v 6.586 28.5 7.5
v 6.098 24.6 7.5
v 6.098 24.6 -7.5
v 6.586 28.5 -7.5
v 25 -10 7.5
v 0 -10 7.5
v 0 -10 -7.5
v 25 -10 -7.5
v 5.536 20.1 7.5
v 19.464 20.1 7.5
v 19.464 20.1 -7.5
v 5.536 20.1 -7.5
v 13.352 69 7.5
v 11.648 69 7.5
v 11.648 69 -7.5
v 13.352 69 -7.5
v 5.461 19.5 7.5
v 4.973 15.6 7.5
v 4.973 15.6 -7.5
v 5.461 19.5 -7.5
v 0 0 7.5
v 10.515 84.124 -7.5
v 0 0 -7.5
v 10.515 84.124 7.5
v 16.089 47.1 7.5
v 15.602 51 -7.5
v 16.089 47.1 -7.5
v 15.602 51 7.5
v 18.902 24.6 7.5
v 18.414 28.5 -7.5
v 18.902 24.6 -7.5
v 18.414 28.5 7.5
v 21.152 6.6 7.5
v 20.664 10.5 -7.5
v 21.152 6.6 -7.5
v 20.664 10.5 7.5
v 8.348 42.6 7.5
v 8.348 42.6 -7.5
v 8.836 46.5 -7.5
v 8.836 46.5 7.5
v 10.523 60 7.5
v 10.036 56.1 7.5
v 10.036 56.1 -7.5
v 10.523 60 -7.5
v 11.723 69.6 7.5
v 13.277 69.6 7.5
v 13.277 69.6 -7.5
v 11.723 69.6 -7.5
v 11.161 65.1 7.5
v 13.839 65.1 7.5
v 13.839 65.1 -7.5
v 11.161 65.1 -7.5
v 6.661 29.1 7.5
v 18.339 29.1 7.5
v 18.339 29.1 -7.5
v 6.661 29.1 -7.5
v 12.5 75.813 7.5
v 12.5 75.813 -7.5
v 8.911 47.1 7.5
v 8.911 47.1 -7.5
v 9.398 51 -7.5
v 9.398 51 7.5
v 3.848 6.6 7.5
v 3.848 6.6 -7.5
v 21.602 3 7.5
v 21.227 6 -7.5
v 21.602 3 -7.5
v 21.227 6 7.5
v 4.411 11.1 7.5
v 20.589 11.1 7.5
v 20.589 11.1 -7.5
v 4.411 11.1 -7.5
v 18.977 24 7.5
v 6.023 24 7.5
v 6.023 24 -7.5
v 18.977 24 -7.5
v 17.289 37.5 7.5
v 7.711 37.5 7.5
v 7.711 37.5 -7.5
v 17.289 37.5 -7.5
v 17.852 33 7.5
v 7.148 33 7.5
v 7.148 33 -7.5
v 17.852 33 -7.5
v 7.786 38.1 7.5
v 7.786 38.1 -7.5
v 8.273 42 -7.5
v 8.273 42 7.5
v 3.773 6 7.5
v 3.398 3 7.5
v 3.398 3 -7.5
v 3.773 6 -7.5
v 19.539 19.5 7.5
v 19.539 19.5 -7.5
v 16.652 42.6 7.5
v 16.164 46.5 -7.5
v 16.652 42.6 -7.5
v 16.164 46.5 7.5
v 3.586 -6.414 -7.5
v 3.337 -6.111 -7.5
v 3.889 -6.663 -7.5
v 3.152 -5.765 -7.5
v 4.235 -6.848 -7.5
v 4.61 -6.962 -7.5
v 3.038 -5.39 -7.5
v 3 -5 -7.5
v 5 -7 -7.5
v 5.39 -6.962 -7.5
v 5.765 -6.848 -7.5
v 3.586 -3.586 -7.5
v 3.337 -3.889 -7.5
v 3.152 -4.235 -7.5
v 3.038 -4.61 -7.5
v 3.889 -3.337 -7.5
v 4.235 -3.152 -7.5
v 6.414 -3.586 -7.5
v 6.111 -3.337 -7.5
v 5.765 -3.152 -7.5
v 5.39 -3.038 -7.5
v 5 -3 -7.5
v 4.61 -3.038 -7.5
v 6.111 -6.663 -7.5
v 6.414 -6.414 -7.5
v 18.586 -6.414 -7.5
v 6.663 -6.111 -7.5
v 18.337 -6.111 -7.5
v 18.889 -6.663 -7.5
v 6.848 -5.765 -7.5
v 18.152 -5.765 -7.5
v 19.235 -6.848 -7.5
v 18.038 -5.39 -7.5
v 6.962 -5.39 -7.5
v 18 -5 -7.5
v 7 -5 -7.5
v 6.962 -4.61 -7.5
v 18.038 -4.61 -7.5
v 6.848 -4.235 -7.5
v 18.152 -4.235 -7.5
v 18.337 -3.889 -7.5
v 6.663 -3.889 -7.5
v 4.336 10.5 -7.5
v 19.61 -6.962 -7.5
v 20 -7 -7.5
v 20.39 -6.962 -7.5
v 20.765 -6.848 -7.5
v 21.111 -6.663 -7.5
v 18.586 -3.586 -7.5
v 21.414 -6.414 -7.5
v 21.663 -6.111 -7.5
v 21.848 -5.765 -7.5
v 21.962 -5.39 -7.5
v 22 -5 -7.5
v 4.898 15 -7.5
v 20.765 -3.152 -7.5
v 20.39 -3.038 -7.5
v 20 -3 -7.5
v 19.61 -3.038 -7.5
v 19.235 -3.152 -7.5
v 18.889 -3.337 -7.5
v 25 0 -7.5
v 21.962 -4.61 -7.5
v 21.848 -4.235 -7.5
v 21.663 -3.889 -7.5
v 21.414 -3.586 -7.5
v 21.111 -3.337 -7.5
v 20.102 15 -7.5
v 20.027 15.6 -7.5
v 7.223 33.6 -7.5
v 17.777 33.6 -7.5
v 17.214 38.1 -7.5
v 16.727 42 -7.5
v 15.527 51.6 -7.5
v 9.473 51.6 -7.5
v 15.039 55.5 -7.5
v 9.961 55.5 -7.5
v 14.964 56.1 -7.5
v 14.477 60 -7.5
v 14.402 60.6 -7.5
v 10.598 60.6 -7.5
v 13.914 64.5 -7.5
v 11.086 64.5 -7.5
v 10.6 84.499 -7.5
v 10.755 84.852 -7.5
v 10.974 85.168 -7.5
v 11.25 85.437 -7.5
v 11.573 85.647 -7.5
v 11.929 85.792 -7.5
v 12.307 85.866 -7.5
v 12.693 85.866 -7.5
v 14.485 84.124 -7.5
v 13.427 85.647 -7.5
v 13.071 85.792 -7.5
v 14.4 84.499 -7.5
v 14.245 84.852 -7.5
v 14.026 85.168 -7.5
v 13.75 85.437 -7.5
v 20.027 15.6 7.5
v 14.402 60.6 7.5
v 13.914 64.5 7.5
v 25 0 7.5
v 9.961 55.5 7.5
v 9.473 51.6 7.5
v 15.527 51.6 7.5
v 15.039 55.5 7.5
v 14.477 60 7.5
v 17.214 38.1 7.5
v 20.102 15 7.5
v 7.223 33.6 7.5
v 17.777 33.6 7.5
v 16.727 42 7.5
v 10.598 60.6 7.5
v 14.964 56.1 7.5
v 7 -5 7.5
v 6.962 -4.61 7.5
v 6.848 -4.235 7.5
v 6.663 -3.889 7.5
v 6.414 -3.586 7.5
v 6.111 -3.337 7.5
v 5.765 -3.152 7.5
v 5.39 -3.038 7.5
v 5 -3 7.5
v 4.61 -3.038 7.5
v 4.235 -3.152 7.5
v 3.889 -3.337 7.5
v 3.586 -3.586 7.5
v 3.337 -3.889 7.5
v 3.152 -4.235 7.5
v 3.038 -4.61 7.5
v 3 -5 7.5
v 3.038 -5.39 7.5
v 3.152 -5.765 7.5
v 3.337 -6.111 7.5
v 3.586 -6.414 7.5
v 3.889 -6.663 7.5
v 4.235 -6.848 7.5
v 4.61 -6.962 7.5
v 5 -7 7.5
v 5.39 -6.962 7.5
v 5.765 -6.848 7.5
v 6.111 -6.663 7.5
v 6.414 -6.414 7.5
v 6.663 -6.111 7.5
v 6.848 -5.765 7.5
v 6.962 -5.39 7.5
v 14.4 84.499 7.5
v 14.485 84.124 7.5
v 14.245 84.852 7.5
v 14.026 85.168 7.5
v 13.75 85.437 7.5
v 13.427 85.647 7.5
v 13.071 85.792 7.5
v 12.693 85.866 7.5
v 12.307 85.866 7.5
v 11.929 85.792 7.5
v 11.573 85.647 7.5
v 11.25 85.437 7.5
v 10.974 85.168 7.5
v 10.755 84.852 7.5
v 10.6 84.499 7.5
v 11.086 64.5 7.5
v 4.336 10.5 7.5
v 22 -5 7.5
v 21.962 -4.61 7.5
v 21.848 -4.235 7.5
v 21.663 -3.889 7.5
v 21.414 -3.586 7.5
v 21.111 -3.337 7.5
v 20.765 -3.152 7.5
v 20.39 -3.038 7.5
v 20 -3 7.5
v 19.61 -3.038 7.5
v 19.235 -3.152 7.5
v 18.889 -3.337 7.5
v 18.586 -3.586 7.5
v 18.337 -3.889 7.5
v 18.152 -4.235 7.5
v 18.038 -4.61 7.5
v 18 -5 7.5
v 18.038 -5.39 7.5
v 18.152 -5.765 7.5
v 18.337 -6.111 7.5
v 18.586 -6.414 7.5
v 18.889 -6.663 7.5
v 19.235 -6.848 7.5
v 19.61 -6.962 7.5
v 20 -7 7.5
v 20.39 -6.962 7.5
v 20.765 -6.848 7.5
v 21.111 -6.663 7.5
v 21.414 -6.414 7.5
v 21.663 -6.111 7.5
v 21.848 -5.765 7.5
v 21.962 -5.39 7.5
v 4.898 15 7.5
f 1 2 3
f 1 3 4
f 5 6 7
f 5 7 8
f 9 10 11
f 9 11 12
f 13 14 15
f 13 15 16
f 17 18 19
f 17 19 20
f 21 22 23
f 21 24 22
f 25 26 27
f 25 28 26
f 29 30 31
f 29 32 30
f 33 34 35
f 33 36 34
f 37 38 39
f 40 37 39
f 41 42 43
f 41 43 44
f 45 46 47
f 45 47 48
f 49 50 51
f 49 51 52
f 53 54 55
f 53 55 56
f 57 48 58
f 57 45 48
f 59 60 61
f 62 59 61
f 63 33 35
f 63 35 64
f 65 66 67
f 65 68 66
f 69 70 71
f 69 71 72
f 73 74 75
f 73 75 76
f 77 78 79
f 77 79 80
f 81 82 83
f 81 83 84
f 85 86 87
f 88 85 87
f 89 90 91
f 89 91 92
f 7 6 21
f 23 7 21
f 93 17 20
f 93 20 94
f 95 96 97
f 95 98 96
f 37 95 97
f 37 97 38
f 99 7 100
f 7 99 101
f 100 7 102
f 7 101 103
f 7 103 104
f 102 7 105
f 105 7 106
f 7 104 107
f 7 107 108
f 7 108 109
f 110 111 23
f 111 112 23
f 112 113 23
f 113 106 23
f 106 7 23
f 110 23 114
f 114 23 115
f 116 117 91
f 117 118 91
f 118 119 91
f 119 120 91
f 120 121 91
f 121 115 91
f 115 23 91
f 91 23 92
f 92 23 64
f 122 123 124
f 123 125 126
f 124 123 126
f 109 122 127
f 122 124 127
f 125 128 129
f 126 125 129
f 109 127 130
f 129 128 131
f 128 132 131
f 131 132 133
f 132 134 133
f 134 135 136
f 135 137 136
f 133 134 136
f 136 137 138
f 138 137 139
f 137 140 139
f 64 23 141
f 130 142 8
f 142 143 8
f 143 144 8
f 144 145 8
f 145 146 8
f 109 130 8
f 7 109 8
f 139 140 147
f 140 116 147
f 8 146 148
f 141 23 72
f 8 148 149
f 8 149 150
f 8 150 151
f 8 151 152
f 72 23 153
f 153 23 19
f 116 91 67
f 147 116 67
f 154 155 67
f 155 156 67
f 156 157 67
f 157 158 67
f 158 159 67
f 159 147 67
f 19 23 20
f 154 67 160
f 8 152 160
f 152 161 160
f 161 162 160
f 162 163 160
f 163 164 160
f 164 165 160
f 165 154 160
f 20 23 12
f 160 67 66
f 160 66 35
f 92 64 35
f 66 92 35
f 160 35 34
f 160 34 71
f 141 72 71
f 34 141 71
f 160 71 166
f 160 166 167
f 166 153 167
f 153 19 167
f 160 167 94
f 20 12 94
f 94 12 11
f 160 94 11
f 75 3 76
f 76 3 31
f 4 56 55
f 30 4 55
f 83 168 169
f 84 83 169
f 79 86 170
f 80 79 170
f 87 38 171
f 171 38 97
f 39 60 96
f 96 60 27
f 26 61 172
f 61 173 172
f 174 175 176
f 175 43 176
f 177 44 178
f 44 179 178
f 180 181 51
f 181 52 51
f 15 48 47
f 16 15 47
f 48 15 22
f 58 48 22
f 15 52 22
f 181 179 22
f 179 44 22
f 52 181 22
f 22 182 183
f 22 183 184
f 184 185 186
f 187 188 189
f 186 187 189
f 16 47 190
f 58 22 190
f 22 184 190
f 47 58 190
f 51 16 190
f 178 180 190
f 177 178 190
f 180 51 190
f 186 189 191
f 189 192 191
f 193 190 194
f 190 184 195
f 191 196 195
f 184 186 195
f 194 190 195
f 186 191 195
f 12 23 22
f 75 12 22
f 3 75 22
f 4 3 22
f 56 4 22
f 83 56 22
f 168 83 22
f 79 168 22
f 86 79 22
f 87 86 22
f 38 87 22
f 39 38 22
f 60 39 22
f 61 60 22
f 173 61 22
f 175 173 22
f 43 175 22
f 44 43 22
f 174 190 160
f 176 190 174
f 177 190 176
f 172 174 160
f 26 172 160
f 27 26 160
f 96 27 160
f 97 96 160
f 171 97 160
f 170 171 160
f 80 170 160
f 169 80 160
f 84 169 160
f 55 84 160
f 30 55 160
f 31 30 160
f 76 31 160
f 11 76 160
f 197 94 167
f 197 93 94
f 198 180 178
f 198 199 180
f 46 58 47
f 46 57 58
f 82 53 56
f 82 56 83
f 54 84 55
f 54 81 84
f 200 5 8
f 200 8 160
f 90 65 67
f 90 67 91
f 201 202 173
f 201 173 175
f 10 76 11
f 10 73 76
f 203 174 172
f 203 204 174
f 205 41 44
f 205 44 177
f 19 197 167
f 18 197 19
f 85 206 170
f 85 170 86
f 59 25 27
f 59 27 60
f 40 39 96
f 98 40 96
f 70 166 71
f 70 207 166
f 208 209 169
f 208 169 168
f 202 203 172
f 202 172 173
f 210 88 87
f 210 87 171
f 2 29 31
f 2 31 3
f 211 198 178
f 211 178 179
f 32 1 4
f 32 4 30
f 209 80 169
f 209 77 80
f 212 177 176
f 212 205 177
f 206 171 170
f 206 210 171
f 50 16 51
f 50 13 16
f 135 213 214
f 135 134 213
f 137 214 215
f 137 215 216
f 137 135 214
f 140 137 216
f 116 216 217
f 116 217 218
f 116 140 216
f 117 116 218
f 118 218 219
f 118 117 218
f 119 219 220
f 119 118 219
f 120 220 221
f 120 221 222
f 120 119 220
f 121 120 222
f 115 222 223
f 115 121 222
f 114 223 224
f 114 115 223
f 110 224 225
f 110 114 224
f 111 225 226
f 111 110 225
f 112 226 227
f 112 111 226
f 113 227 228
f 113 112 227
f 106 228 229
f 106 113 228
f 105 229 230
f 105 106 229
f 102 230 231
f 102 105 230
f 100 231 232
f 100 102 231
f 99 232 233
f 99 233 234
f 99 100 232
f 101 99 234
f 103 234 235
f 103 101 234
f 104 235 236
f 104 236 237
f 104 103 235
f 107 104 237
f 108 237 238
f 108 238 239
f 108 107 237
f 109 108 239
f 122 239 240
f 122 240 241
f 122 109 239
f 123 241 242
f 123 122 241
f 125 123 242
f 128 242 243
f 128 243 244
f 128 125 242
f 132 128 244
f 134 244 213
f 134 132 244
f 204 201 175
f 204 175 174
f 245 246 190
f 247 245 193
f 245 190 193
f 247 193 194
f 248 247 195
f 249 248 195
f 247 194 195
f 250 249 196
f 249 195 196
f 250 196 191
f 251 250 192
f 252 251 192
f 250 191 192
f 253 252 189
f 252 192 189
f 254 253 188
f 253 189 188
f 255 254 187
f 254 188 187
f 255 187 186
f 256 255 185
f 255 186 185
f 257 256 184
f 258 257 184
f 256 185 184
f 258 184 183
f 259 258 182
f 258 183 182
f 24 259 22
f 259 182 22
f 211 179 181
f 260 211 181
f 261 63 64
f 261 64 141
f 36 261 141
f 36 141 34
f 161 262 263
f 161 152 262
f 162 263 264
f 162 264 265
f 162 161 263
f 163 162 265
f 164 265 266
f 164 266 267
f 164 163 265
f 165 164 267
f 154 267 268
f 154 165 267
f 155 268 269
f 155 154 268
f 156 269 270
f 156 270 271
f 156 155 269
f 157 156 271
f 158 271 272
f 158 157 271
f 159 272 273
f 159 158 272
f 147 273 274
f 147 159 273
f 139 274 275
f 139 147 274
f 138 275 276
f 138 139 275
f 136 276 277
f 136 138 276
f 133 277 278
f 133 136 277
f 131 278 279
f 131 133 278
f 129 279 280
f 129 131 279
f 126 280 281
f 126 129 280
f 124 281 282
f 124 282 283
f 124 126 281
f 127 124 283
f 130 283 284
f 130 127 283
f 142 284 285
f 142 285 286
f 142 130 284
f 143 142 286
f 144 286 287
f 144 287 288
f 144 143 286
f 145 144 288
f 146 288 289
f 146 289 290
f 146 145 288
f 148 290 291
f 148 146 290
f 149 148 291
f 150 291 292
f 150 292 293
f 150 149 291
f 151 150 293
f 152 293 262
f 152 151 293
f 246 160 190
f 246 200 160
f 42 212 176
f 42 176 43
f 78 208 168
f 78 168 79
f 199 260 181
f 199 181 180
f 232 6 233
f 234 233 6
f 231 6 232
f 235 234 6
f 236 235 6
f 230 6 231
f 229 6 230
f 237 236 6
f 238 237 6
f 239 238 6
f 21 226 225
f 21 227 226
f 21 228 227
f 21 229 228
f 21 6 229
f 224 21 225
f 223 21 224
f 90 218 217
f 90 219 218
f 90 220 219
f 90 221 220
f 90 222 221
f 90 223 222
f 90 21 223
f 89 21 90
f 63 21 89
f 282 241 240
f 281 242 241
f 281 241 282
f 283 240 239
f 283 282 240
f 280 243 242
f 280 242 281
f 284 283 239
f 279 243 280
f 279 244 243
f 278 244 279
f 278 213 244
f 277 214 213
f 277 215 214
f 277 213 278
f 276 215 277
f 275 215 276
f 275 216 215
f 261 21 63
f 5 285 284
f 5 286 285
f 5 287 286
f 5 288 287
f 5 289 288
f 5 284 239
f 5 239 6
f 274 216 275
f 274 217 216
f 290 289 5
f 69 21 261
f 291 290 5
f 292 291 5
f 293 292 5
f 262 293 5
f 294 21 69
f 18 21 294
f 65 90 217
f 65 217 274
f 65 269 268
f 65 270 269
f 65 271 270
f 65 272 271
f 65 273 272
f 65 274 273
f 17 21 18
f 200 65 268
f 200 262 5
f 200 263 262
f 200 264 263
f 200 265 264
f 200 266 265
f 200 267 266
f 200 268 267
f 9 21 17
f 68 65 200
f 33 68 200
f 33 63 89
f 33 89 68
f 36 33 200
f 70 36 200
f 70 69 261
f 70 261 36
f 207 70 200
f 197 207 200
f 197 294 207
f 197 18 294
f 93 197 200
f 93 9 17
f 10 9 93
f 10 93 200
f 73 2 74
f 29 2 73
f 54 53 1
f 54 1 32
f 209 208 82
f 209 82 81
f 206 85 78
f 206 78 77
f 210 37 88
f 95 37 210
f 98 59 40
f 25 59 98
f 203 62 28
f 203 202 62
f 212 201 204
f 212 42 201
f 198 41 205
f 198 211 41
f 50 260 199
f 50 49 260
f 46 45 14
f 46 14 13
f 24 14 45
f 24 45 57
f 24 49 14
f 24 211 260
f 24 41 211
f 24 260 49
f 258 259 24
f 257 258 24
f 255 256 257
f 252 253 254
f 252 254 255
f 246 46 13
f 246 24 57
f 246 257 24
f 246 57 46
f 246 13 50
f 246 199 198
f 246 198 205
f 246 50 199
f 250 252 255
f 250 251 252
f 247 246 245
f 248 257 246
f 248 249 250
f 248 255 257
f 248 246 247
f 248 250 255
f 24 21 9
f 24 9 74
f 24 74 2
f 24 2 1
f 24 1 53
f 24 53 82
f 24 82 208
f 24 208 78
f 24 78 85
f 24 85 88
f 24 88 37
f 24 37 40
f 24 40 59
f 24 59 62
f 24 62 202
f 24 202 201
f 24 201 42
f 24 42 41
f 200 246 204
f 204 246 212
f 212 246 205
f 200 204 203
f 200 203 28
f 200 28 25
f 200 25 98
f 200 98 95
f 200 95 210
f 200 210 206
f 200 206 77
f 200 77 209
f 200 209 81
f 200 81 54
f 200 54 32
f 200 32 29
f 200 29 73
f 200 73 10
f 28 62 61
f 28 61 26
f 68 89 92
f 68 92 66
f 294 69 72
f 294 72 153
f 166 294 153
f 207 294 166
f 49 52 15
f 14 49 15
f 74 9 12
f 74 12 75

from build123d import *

# Parameters (mm, degrees)
F0_W     = 25
F0_H     = 10
F0_R     = 2
F1_DEPTH = 7.5
F2_R     = 2


# Not quite as in the source:
# - a feature names something its author has since deleted; it is built from what else it names


with BuildPart() as f1:
    # F0 (on Top) → F1 (new body, symmetric)
    with BuildSketch(Plane.XY):
        Polygon((17.8516533444, 33), (20.875, 33), (20.8, 33.6), (17.7766533444, 33.6), align=None)
        Polygon((17.7766533444, 33.6), (20.8, 33.6), (20.3125, 37.5), (17.2891533444, 37.5), align=None)
        Polygon((17.2891533444, 37.5), (20.3125, 37.5), (20.2375, 38.1), (17.2141533444, 38.1), align=None)
        Polygon((17.2141533444, 38.1), (20.2375, 38.1), (19.75, 42), (16.7266533444, 42), align=None)
        Polygon((16.7266533444, 42), (19.75, 42), (19.675, 42.6), (16.6516533444, 42.6), align=None)
        Polygon((16.6516533444, 42.6), (19.675, 42.6), (19.1875, 46.5), (16.1641533444, 46.5), align=None)
        Polygon((16.1641533444, 46.5), (19.1875, 46.5), (19.1125, 47.1), (16.0891533444, 47.1), align=None)
        Polygon((16.0891533444, 47.1), (19.1125, 47.1), (18.625, 51), (15.6016533444, 51), align=None)
        Polygon((15.6016533444, 51), (18.625, 51), (18.55, 51.6), (15.5266533444, 51.6), align=None)
        Polygon((15.5266533444, 51.6), (18.55, 51.6), (18.0625, 55.5), (15.0391533444, 55.5), align=None)
        Polygon((15.0391533444, 55.5), (18.0625, 55.5), (17.9875, 56.1), (14.9641533444, 56.1), align=None)
        Polygon((14.9641533444, 56.1), (17.9875, 56.1), (17.5, 60), (14.4766533444, 60), align=None)
        Polygon((14.4766533444, 60), (17.5, 60), (17.425, 60.6), (14.4016533444, 60.6), align=None)
        Polygon((14.4016533444, 60.6), (17.425, 60.6), (16.9375, 64.5), (13.9141533444, 64.5), align=None)
        Polygon((13.9141533444, 64.5), (16.9375, 64.5), (16.8625, 65.1), (13.8391533444, 65.1), align=None)
        Polygon((13.8391533444, 65.1), (16.8625, 65.1), (16.375, 69), (13.3516533444, 69), align=None)
        Polygon((13.3516533444, 69), (16.375, 69), (16.3, 69.6), (13.2766533444, 69.6), align=None)
        Polygon((12.5, 100), (8.7, 69.6), (11.7233466556, 69.6), (12.5, 75.8132267551), (13.2766533444, 69.6), (16.3, 69.6), align=None)
        with Locations((12.5, -5)):
            Rectangle(F0_W, F0_H)
        with Locations((5, -5)):
            Circle(F0_R, mode=Mode.SUBTRACT)
        with Locations((20, -5)):
            Circle(F0_R, mode=Mode.SUBTRACT)
        Polygon((8.0625, 64.5), (7.575, 60.6), (10.5983466556, 60.6), (11.0858466556, 64.5), align=None)
        Polygon((8.7, 69.6), (8.625, 69), (11.6483466556, 69), (11.7233466556, 69.6), align=None)
        Polygon((8.1375, 65.1), (8.0625, 64.5), (11.0858466556, 64.5), (11.1608466556, 65.1), align=None)
        Polygon((8.625, 69), (8.1375, 65.1), (11.1608466556, 65.1), (11.6483466556, 69), align=None)
        Polygon((6.375, 51), (5.8875, 47.1), (8.9108466556, 47.1), (9.3983466556, 51), align=None)
        Polygon((7.5, 60), (7.0125, 56.1), (10.0358466556, 56.1), (10.5233466556, 60), align=None)
        Polygon((7.0125, 56.1), (6.9375, 55.5), (9.9608466556, 55.5), (10.0358466556, 56.1), align=None)
        Polygon((7.575, 60.6), (7.5, 60), (10.5233466556, 60), (10.5983466556, 60.6), align=None)
        Polygon((6.45, 51.6), (6.375, 51), (9.3983466556, 51), (9.4733466556, 51.6), align=None)
        Polygon((6.9375, 55.5), (6.45, 51.6), (9.4733466556, 51.6), (9.9608466556, 55.5), align=None)
        Polygon((5.25, 42), (4.7625, 38.1), (7.7858466556, 38.1), (8.2733466556, 42), align=None)
        Polygon((4.2, 33.6), (4.125, 33), (7.1483466556, 33), (7.2233466556, 33.6), align=None)
        Polygon((5.325, 42.6), (5.25, 42), (8.2733466556, 42), (8.3483466556, 42.6), align=None)
        Polygon((5.8125, 46.5), (5.325, 42.6), (8.3483466556, 42.6), (8.8358466556, 46.5), align=None)
        Polygon((4.6875, 37.5), (4.2, 33.6), (7.2233466556, 33.6), (7.7108466556, 37.5), align=None)
        Polygon((4.125, 33), (0, 0), (25, 0), (20.875, 33), (17.8516533444, 33), (18.3391533444, 29.1), (18.4141533444, 28.5), (18.9016533444, 24.6), (18.9766533444, 24), (19.4641533444, 20.1), (19.5391533444, 19.5), (20.0266533444, 15.6), (20.1016533444, 15), (20.5891533444, 11.1), (20.6641533444, 10.5), (21.1516533444, 6.6), (21.2266533444, 6), (21.6016533444, 3), (3.3983466556, 3), (3.7733466556, 6), (3.8483466556, 6.6), (4.3358466556, 10.5), (4.4108466556, 11.1), (4.8983466556, 15), (4.9733466556, 15.6), (5.4608466556, 19.5), (5.5358466556, 20.1), (6.0233466556, 24), (6.0983466556, 24.6), (6.5858466556, 28.5), (6.6608466556, 29.1), (7.1483466556, 33), align=None)
        Polygon((5.8875, 47.1), (5.8125, 46.5), (8.8358466556, 46.5), (8.9108466556, 47.1), align=None)
        Polygon((4.7625, 38.1), (4.6875, 37.5), (7.7108466556, 37.5), (7.7858466556, 38.1), align=None)
        Polygon((21.1516533444, 6.6), (3.8483466556, 6.6), (3.7733466556, 6), (21.2266533444, 6), align=None)
        Polygon((20.5891533444, 11.1), (4.4108466556, 11.1), (4.3358466556, 10.5), (20.6641533444, 10.5), align=None)
        Polygon((20.0266533444, 15.6), (4.9733466556, 15.6), (4.8983466556, 15), (20.1016533444, 15), align=None)
        Polygon((19.4641533444, 20.1), (5.5358466556, 20.1), (5.4608466556, 19.5), (19.5391533444, 19.5), align=None)
        Polygon((18.9016533444, 24.6), (6.0983466556, 24.6), (6.0233466556, 24), (18.9766533444, 24), align=None)
        Polygon((18.3391533444, 29.1), (6.6608466556, 29.1), (6.5858466556, 28.5), (18.4141533444, 28.5), align=None)
        Polygon((7.2233466556, 33.6), (7.1483466556, 33), (17.8516533444, 33), (17.7766533444, 33.6), align=None)
        Polygon((7.7858466556, 38.1), (7.7108466556, 37.5), (17.2891533444, 37.5), (17.2141533444, 38.1), align=None)
        Polygon((8.3483466556, 42.6), (8.2733466556, 42), (16.7266533444, 42), (16.6516533444, 42.6), align=None)
        Polygon((8.9108466556, 47.1), (8.8358466556, 46.5), (16.1641533444, 46.5), (16.0891533444, 47.1), align=None)
        Polygon((9.4733466556, 51.6), (9.3983466556, 51), (15.6016533444, 51), (15.5266533444, 51.6), align=None)
        Polygon((10.0358466556, 56.1), (9.9608466556, 55.5), (15.0391533444, 55.5), (14.9641533444, 56.1), align=None)
        Polygon((10.5983466556, 60.6), (10.5233466556, 60), (14.4766533444, 60), (14.4016533444, 60.6), align=None)
        Polygon((11.1608466556, 65.1), (11.0858466556, 64.5), (13.9141533444, 64.5), (13.8391533444, 65.1), align=None)
        Polygon((11.7233466556, 69.6), (11.6483466556, 69), (13.3516533444, 69), (13.2766533444, 69.6), align=None)
    extrude(amount=F1_DEPTH, both=True)

    # F2
    f2_edges = [f1.edges().sort_by_distance(p)[0] for p in [
        (12.5, 100, 0),
    ]]
    fillet(f2_edges, radius=F2_R)


solid = f1.part
